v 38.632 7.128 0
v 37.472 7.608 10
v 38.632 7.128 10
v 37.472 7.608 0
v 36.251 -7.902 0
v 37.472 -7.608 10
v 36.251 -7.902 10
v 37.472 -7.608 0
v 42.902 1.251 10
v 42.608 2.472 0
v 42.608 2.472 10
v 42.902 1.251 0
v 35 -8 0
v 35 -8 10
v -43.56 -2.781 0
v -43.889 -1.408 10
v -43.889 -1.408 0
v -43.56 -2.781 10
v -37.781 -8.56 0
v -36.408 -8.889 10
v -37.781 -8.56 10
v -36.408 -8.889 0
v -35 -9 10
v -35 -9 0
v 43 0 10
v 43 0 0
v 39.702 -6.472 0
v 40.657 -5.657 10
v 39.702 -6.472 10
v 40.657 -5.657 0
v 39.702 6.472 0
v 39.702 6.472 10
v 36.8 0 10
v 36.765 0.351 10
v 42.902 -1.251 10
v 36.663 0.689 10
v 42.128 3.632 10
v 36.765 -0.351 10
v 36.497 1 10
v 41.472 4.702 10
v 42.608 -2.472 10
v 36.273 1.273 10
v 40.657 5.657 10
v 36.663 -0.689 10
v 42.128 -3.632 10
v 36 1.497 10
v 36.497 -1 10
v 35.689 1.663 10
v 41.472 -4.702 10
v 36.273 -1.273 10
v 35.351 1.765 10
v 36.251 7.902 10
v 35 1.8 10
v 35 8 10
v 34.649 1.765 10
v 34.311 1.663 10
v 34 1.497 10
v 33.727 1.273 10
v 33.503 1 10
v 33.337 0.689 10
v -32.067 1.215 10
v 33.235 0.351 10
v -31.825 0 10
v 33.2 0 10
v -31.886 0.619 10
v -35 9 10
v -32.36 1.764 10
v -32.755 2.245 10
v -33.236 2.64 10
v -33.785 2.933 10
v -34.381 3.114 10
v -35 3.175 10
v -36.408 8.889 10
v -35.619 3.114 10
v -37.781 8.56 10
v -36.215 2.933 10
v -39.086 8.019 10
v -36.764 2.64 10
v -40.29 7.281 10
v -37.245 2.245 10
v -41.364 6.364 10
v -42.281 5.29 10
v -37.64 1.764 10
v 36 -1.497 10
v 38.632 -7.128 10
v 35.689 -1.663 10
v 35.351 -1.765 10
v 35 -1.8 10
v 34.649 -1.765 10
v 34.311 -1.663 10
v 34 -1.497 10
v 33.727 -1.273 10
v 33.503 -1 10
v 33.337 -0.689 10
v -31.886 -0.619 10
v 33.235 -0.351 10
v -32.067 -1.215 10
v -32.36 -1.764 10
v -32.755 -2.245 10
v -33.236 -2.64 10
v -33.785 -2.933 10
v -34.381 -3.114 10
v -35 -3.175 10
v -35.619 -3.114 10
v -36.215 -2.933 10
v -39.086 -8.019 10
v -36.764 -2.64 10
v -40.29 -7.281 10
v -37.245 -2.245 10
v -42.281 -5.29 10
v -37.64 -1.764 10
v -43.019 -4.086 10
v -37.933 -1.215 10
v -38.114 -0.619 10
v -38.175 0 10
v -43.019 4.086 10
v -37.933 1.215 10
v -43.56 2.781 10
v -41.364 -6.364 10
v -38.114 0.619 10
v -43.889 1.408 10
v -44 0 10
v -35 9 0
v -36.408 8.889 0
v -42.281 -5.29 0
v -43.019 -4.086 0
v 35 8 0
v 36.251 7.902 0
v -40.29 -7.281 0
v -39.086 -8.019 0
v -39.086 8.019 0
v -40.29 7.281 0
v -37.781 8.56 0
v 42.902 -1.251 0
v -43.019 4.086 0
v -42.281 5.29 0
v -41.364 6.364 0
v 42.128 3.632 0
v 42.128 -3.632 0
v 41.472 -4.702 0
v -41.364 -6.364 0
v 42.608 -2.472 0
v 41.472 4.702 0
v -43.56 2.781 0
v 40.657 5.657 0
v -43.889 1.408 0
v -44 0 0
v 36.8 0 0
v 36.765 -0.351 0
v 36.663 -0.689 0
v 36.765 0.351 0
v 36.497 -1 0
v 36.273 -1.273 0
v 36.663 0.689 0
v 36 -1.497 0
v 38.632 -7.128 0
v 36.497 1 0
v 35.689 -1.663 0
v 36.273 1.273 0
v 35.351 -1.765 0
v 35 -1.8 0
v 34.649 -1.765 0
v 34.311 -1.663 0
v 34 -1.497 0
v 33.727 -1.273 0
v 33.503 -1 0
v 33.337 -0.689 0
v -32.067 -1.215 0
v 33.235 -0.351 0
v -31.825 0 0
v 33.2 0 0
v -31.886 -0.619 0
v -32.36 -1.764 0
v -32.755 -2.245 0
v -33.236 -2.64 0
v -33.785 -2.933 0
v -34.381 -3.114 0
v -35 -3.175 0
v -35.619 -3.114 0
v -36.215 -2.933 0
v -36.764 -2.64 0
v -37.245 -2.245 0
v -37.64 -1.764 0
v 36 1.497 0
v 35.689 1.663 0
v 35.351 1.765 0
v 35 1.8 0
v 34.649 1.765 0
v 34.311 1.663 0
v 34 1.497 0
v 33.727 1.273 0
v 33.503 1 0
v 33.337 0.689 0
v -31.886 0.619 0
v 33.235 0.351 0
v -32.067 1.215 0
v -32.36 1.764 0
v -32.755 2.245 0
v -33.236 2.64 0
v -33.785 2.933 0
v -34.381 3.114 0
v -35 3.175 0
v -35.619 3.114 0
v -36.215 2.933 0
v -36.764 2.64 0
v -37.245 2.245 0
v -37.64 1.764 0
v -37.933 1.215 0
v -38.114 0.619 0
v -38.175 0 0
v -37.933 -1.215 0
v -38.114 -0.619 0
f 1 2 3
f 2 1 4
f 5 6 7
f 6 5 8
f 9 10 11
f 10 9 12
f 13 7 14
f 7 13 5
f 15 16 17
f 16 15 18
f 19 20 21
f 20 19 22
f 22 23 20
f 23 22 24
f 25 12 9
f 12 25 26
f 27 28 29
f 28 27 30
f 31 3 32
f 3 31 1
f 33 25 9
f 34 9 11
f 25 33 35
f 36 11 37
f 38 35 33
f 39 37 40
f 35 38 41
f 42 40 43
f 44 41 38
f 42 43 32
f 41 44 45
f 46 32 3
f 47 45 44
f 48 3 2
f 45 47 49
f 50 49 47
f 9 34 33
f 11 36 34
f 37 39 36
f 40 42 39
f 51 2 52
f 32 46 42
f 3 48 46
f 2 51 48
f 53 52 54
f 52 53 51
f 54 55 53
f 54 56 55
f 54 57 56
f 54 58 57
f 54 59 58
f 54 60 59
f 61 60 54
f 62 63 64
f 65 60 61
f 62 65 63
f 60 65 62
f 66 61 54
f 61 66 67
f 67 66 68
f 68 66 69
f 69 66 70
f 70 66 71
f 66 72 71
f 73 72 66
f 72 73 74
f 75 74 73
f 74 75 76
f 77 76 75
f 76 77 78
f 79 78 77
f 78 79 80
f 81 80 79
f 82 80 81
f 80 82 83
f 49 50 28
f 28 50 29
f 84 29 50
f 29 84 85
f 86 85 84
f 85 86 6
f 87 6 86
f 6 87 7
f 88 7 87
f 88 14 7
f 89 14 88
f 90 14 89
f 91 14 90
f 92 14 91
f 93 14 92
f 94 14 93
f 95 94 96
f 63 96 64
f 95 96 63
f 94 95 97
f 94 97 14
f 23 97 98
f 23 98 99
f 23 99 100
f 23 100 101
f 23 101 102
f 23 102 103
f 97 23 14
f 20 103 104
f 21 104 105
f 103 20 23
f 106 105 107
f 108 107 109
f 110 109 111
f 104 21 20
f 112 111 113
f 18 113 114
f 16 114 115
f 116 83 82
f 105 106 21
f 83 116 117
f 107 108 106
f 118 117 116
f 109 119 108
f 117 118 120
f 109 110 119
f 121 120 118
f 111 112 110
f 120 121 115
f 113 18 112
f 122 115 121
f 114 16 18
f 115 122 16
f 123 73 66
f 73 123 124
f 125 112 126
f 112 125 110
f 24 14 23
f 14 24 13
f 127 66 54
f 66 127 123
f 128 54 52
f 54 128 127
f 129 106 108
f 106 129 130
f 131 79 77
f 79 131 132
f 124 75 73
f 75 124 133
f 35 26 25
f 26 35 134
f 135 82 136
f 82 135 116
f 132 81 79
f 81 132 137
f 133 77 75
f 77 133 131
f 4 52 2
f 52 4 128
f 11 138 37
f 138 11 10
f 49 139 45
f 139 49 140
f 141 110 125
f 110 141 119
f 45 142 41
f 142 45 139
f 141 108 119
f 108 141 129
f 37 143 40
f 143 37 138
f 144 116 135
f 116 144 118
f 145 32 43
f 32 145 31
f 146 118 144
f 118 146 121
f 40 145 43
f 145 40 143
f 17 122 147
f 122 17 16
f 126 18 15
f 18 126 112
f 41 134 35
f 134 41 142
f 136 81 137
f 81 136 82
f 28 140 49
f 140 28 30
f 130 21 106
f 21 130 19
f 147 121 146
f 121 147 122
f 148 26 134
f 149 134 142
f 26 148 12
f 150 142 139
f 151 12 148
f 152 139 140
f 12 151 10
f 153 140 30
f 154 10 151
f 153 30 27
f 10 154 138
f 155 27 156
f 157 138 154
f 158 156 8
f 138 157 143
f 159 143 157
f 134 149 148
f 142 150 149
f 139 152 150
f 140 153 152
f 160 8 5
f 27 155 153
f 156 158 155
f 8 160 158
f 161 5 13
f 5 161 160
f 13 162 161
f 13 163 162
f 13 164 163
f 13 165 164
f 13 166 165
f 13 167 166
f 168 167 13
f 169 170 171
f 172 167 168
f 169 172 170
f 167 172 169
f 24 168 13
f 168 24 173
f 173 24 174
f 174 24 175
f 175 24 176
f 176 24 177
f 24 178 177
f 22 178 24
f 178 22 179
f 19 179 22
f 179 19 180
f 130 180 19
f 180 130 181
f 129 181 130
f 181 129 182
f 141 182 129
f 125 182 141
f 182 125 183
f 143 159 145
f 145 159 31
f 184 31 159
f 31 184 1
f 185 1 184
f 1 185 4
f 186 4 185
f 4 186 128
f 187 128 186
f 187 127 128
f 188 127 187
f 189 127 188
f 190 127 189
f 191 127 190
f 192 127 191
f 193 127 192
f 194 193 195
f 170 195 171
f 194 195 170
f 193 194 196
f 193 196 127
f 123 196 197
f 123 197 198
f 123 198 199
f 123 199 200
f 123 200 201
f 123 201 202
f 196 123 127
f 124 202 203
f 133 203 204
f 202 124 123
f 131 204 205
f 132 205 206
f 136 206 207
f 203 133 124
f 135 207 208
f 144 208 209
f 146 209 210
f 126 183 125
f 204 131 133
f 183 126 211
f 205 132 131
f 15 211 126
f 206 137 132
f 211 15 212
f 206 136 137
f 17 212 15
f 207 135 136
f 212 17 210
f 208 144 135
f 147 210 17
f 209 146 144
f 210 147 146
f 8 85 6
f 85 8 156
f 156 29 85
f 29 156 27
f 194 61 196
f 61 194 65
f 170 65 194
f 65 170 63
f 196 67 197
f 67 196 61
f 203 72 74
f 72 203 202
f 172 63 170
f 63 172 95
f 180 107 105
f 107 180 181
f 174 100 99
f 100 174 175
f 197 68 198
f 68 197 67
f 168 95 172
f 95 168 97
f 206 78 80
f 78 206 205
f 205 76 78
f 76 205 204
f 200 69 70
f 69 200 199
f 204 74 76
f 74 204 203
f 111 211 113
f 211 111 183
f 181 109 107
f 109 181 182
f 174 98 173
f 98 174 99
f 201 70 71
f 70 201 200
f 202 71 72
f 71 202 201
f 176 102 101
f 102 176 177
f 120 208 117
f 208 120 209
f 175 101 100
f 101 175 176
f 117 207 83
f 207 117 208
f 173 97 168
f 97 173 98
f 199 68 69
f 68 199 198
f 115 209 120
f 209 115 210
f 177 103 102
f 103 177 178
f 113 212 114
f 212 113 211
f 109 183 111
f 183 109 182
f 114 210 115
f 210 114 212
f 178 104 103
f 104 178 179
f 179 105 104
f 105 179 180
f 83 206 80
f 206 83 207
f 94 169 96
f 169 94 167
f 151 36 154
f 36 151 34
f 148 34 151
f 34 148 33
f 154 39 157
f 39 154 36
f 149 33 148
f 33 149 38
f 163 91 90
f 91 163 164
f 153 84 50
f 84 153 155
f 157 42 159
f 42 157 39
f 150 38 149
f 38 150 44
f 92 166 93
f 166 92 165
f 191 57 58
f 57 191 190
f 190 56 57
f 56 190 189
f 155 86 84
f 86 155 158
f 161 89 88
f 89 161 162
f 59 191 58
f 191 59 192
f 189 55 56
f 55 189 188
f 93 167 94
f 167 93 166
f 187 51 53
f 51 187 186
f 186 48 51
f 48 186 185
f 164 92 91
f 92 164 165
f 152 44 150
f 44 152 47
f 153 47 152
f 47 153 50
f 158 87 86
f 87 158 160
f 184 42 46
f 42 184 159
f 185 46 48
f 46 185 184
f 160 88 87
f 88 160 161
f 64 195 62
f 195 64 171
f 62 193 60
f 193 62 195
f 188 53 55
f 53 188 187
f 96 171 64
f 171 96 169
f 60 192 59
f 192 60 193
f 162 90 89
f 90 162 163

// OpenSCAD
$fn = 32;

// ----------------------------------------------------------------------
// Lever: 70 mm between the bosses, 10 mm thick, smooth outline
// ----------------------------------------------------------------------

// --- parameters (mm) ---
lever_l = 70;             // distance between the boss centres
boss_a = 18;              // first boss diameter
boss_b = 16;              // second boss diameter
bore_a = 6.35;            // first bore
bore_b = 3.6;             // second bore
lever_t = 10;             // lever thickness

lever_profile = [[-44, 0], [-43.889, -1.408], [-43.56, -2.781], [-43.019, -4.086], [-42.281, -5.29], [-41.364, -6.364], [-40.29, -7.281], [-39.086, -8.019], [-37.781, -8.56], [-36.408, -8.889], [-35, -9], [35, -8], [36.251, -7.902], [37.472, -7.608], [38.632, -7.128], [39.702, -6.472], [40.657, -5.657], [41.472, -4.702], [42.128, -3.632], [42.608, -2.472], [42.902, -1.251], [43, 0], [42.902, 1.251], [42.608, 2.472], [42.128, 3.632], [41.472, 4.702], [40.657, 5.657], [39.702, 6.472], [38.632, 7.128], [37.472, 7.608], [36.251, 7.902], [35, 8], [-35, 9], [-36.408, 8.889], [-37.781, 8.56], [-39.086, 8.019], [-40.29, 7.281], [-41.364, 6.364], [-42.281, 5.29], [-43.019, 4.086], [-43.56, 2.781], [-43.889, 1.408]];

difference() {
  linear_extrude(height = lever_t) polygon(lever_profile);
  translate([-35, 0, -2.5]) cylinder(h = lever_t + 5, d = bore_a);
  translate([35, 0, -2.5]) cylinder(h = lever_t + 5, d = bore_b);
}
